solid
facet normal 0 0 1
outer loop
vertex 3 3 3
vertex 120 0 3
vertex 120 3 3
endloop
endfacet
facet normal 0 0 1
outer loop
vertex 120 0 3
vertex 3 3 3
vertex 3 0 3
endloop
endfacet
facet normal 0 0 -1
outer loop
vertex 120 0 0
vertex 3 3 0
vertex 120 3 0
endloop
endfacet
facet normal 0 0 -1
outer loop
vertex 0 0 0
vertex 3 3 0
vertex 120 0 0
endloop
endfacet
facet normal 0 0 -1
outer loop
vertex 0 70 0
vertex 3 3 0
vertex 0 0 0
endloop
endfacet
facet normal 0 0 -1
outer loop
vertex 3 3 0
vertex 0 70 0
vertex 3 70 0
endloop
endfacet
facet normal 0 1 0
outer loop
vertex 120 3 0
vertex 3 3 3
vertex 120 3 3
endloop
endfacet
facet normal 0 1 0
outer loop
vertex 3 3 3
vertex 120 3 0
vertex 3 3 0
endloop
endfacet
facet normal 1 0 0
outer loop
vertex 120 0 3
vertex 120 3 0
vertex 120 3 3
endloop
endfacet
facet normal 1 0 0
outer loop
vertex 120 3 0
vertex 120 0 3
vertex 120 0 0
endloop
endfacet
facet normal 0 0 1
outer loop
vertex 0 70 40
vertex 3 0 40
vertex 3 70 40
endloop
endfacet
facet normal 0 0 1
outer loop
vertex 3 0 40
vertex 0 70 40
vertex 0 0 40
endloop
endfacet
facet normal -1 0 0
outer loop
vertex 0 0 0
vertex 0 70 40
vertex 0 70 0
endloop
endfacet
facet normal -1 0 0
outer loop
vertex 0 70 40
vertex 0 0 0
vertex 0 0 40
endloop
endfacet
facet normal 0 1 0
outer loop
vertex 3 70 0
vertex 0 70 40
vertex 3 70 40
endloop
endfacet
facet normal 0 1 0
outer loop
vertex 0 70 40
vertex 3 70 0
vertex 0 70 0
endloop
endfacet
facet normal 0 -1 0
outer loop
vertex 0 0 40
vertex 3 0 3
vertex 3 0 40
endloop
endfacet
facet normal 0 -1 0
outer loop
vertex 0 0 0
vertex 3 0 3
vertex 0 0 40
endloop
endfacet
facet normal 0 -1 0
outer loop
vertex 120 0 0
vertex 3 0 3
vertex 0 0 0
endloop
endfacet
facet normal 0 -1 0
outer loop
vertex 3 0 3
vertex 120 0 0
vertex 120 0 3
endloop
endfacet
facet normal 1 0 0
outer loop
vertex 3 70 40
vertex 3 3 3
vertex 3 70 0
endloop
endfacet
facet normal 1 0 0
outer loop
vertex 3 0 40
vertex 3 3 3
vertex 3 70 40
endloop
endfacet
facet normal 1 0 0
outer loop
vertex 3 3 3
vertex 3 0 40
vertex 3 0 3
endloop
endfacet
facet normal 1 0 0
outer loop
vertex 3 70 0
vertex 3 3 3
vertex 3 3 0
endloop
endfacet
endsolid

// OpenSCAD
// Buffer tank for a mini horizontal gel-electrophoresis box. Open-top rectangular tank with a
// solid raised platform for the gel tray that divides the bottom into two buffer chambers. Each
// end wall gets a 2 mm horizontal hole along X for the electrode wires.
//

tank_X = 120;
tank_Y = 70;
tank_Z = 40;
wall   = 3;
floor  = 3;
platform_X = 60;
platform_Z = 10;

$fn = 64;

inner_X = tank_X - 2 * wall;
inner_Z = tank_Z - floor;

difference() {
    cube([tank_X, tank_Y, tank_Z]);
    translate([wall, 0, floor]) cube([tank_X, tank_Y, tank_Z - floor]);     // hollow, open top
    translate([wall, wall, floor]) cube([inner_X, tank_Y, tank_Z - floor]); // remove floor -> open bottom

    translate([wall, wall, 0]) cube([inner_X, tank_Y, platform_Z]);                 // raised platform
    translate([wall, wall, platform_Z]) cube([platform_X, tank_Y, wall]);           // end blocks of the platform

    for (x = [tank_X / 2 - platform_X / 2, tank_X / 2 + platform_X / 2])
        translate([x, wall, 0]) cube([platform_X, tank_Y, wall]);                  // bridge the two chambers above the platform

    for (x = [tank_X / 2 - platform_X / 2, tank_X / 2 + platform_X / 2])
        translate([x, wall, 0]) cube([wall, tank_Y, tank_Z - floor]);               // end walls with the horizontal electrode holes
    for (x = [tank_X / 2 - platform_X / 2, tank_X / 2 + platform_X / 2])
        translate([x, wall, tank_Z - floor]) cylinder(h = wall, d = 2);            // electrode holes
}
